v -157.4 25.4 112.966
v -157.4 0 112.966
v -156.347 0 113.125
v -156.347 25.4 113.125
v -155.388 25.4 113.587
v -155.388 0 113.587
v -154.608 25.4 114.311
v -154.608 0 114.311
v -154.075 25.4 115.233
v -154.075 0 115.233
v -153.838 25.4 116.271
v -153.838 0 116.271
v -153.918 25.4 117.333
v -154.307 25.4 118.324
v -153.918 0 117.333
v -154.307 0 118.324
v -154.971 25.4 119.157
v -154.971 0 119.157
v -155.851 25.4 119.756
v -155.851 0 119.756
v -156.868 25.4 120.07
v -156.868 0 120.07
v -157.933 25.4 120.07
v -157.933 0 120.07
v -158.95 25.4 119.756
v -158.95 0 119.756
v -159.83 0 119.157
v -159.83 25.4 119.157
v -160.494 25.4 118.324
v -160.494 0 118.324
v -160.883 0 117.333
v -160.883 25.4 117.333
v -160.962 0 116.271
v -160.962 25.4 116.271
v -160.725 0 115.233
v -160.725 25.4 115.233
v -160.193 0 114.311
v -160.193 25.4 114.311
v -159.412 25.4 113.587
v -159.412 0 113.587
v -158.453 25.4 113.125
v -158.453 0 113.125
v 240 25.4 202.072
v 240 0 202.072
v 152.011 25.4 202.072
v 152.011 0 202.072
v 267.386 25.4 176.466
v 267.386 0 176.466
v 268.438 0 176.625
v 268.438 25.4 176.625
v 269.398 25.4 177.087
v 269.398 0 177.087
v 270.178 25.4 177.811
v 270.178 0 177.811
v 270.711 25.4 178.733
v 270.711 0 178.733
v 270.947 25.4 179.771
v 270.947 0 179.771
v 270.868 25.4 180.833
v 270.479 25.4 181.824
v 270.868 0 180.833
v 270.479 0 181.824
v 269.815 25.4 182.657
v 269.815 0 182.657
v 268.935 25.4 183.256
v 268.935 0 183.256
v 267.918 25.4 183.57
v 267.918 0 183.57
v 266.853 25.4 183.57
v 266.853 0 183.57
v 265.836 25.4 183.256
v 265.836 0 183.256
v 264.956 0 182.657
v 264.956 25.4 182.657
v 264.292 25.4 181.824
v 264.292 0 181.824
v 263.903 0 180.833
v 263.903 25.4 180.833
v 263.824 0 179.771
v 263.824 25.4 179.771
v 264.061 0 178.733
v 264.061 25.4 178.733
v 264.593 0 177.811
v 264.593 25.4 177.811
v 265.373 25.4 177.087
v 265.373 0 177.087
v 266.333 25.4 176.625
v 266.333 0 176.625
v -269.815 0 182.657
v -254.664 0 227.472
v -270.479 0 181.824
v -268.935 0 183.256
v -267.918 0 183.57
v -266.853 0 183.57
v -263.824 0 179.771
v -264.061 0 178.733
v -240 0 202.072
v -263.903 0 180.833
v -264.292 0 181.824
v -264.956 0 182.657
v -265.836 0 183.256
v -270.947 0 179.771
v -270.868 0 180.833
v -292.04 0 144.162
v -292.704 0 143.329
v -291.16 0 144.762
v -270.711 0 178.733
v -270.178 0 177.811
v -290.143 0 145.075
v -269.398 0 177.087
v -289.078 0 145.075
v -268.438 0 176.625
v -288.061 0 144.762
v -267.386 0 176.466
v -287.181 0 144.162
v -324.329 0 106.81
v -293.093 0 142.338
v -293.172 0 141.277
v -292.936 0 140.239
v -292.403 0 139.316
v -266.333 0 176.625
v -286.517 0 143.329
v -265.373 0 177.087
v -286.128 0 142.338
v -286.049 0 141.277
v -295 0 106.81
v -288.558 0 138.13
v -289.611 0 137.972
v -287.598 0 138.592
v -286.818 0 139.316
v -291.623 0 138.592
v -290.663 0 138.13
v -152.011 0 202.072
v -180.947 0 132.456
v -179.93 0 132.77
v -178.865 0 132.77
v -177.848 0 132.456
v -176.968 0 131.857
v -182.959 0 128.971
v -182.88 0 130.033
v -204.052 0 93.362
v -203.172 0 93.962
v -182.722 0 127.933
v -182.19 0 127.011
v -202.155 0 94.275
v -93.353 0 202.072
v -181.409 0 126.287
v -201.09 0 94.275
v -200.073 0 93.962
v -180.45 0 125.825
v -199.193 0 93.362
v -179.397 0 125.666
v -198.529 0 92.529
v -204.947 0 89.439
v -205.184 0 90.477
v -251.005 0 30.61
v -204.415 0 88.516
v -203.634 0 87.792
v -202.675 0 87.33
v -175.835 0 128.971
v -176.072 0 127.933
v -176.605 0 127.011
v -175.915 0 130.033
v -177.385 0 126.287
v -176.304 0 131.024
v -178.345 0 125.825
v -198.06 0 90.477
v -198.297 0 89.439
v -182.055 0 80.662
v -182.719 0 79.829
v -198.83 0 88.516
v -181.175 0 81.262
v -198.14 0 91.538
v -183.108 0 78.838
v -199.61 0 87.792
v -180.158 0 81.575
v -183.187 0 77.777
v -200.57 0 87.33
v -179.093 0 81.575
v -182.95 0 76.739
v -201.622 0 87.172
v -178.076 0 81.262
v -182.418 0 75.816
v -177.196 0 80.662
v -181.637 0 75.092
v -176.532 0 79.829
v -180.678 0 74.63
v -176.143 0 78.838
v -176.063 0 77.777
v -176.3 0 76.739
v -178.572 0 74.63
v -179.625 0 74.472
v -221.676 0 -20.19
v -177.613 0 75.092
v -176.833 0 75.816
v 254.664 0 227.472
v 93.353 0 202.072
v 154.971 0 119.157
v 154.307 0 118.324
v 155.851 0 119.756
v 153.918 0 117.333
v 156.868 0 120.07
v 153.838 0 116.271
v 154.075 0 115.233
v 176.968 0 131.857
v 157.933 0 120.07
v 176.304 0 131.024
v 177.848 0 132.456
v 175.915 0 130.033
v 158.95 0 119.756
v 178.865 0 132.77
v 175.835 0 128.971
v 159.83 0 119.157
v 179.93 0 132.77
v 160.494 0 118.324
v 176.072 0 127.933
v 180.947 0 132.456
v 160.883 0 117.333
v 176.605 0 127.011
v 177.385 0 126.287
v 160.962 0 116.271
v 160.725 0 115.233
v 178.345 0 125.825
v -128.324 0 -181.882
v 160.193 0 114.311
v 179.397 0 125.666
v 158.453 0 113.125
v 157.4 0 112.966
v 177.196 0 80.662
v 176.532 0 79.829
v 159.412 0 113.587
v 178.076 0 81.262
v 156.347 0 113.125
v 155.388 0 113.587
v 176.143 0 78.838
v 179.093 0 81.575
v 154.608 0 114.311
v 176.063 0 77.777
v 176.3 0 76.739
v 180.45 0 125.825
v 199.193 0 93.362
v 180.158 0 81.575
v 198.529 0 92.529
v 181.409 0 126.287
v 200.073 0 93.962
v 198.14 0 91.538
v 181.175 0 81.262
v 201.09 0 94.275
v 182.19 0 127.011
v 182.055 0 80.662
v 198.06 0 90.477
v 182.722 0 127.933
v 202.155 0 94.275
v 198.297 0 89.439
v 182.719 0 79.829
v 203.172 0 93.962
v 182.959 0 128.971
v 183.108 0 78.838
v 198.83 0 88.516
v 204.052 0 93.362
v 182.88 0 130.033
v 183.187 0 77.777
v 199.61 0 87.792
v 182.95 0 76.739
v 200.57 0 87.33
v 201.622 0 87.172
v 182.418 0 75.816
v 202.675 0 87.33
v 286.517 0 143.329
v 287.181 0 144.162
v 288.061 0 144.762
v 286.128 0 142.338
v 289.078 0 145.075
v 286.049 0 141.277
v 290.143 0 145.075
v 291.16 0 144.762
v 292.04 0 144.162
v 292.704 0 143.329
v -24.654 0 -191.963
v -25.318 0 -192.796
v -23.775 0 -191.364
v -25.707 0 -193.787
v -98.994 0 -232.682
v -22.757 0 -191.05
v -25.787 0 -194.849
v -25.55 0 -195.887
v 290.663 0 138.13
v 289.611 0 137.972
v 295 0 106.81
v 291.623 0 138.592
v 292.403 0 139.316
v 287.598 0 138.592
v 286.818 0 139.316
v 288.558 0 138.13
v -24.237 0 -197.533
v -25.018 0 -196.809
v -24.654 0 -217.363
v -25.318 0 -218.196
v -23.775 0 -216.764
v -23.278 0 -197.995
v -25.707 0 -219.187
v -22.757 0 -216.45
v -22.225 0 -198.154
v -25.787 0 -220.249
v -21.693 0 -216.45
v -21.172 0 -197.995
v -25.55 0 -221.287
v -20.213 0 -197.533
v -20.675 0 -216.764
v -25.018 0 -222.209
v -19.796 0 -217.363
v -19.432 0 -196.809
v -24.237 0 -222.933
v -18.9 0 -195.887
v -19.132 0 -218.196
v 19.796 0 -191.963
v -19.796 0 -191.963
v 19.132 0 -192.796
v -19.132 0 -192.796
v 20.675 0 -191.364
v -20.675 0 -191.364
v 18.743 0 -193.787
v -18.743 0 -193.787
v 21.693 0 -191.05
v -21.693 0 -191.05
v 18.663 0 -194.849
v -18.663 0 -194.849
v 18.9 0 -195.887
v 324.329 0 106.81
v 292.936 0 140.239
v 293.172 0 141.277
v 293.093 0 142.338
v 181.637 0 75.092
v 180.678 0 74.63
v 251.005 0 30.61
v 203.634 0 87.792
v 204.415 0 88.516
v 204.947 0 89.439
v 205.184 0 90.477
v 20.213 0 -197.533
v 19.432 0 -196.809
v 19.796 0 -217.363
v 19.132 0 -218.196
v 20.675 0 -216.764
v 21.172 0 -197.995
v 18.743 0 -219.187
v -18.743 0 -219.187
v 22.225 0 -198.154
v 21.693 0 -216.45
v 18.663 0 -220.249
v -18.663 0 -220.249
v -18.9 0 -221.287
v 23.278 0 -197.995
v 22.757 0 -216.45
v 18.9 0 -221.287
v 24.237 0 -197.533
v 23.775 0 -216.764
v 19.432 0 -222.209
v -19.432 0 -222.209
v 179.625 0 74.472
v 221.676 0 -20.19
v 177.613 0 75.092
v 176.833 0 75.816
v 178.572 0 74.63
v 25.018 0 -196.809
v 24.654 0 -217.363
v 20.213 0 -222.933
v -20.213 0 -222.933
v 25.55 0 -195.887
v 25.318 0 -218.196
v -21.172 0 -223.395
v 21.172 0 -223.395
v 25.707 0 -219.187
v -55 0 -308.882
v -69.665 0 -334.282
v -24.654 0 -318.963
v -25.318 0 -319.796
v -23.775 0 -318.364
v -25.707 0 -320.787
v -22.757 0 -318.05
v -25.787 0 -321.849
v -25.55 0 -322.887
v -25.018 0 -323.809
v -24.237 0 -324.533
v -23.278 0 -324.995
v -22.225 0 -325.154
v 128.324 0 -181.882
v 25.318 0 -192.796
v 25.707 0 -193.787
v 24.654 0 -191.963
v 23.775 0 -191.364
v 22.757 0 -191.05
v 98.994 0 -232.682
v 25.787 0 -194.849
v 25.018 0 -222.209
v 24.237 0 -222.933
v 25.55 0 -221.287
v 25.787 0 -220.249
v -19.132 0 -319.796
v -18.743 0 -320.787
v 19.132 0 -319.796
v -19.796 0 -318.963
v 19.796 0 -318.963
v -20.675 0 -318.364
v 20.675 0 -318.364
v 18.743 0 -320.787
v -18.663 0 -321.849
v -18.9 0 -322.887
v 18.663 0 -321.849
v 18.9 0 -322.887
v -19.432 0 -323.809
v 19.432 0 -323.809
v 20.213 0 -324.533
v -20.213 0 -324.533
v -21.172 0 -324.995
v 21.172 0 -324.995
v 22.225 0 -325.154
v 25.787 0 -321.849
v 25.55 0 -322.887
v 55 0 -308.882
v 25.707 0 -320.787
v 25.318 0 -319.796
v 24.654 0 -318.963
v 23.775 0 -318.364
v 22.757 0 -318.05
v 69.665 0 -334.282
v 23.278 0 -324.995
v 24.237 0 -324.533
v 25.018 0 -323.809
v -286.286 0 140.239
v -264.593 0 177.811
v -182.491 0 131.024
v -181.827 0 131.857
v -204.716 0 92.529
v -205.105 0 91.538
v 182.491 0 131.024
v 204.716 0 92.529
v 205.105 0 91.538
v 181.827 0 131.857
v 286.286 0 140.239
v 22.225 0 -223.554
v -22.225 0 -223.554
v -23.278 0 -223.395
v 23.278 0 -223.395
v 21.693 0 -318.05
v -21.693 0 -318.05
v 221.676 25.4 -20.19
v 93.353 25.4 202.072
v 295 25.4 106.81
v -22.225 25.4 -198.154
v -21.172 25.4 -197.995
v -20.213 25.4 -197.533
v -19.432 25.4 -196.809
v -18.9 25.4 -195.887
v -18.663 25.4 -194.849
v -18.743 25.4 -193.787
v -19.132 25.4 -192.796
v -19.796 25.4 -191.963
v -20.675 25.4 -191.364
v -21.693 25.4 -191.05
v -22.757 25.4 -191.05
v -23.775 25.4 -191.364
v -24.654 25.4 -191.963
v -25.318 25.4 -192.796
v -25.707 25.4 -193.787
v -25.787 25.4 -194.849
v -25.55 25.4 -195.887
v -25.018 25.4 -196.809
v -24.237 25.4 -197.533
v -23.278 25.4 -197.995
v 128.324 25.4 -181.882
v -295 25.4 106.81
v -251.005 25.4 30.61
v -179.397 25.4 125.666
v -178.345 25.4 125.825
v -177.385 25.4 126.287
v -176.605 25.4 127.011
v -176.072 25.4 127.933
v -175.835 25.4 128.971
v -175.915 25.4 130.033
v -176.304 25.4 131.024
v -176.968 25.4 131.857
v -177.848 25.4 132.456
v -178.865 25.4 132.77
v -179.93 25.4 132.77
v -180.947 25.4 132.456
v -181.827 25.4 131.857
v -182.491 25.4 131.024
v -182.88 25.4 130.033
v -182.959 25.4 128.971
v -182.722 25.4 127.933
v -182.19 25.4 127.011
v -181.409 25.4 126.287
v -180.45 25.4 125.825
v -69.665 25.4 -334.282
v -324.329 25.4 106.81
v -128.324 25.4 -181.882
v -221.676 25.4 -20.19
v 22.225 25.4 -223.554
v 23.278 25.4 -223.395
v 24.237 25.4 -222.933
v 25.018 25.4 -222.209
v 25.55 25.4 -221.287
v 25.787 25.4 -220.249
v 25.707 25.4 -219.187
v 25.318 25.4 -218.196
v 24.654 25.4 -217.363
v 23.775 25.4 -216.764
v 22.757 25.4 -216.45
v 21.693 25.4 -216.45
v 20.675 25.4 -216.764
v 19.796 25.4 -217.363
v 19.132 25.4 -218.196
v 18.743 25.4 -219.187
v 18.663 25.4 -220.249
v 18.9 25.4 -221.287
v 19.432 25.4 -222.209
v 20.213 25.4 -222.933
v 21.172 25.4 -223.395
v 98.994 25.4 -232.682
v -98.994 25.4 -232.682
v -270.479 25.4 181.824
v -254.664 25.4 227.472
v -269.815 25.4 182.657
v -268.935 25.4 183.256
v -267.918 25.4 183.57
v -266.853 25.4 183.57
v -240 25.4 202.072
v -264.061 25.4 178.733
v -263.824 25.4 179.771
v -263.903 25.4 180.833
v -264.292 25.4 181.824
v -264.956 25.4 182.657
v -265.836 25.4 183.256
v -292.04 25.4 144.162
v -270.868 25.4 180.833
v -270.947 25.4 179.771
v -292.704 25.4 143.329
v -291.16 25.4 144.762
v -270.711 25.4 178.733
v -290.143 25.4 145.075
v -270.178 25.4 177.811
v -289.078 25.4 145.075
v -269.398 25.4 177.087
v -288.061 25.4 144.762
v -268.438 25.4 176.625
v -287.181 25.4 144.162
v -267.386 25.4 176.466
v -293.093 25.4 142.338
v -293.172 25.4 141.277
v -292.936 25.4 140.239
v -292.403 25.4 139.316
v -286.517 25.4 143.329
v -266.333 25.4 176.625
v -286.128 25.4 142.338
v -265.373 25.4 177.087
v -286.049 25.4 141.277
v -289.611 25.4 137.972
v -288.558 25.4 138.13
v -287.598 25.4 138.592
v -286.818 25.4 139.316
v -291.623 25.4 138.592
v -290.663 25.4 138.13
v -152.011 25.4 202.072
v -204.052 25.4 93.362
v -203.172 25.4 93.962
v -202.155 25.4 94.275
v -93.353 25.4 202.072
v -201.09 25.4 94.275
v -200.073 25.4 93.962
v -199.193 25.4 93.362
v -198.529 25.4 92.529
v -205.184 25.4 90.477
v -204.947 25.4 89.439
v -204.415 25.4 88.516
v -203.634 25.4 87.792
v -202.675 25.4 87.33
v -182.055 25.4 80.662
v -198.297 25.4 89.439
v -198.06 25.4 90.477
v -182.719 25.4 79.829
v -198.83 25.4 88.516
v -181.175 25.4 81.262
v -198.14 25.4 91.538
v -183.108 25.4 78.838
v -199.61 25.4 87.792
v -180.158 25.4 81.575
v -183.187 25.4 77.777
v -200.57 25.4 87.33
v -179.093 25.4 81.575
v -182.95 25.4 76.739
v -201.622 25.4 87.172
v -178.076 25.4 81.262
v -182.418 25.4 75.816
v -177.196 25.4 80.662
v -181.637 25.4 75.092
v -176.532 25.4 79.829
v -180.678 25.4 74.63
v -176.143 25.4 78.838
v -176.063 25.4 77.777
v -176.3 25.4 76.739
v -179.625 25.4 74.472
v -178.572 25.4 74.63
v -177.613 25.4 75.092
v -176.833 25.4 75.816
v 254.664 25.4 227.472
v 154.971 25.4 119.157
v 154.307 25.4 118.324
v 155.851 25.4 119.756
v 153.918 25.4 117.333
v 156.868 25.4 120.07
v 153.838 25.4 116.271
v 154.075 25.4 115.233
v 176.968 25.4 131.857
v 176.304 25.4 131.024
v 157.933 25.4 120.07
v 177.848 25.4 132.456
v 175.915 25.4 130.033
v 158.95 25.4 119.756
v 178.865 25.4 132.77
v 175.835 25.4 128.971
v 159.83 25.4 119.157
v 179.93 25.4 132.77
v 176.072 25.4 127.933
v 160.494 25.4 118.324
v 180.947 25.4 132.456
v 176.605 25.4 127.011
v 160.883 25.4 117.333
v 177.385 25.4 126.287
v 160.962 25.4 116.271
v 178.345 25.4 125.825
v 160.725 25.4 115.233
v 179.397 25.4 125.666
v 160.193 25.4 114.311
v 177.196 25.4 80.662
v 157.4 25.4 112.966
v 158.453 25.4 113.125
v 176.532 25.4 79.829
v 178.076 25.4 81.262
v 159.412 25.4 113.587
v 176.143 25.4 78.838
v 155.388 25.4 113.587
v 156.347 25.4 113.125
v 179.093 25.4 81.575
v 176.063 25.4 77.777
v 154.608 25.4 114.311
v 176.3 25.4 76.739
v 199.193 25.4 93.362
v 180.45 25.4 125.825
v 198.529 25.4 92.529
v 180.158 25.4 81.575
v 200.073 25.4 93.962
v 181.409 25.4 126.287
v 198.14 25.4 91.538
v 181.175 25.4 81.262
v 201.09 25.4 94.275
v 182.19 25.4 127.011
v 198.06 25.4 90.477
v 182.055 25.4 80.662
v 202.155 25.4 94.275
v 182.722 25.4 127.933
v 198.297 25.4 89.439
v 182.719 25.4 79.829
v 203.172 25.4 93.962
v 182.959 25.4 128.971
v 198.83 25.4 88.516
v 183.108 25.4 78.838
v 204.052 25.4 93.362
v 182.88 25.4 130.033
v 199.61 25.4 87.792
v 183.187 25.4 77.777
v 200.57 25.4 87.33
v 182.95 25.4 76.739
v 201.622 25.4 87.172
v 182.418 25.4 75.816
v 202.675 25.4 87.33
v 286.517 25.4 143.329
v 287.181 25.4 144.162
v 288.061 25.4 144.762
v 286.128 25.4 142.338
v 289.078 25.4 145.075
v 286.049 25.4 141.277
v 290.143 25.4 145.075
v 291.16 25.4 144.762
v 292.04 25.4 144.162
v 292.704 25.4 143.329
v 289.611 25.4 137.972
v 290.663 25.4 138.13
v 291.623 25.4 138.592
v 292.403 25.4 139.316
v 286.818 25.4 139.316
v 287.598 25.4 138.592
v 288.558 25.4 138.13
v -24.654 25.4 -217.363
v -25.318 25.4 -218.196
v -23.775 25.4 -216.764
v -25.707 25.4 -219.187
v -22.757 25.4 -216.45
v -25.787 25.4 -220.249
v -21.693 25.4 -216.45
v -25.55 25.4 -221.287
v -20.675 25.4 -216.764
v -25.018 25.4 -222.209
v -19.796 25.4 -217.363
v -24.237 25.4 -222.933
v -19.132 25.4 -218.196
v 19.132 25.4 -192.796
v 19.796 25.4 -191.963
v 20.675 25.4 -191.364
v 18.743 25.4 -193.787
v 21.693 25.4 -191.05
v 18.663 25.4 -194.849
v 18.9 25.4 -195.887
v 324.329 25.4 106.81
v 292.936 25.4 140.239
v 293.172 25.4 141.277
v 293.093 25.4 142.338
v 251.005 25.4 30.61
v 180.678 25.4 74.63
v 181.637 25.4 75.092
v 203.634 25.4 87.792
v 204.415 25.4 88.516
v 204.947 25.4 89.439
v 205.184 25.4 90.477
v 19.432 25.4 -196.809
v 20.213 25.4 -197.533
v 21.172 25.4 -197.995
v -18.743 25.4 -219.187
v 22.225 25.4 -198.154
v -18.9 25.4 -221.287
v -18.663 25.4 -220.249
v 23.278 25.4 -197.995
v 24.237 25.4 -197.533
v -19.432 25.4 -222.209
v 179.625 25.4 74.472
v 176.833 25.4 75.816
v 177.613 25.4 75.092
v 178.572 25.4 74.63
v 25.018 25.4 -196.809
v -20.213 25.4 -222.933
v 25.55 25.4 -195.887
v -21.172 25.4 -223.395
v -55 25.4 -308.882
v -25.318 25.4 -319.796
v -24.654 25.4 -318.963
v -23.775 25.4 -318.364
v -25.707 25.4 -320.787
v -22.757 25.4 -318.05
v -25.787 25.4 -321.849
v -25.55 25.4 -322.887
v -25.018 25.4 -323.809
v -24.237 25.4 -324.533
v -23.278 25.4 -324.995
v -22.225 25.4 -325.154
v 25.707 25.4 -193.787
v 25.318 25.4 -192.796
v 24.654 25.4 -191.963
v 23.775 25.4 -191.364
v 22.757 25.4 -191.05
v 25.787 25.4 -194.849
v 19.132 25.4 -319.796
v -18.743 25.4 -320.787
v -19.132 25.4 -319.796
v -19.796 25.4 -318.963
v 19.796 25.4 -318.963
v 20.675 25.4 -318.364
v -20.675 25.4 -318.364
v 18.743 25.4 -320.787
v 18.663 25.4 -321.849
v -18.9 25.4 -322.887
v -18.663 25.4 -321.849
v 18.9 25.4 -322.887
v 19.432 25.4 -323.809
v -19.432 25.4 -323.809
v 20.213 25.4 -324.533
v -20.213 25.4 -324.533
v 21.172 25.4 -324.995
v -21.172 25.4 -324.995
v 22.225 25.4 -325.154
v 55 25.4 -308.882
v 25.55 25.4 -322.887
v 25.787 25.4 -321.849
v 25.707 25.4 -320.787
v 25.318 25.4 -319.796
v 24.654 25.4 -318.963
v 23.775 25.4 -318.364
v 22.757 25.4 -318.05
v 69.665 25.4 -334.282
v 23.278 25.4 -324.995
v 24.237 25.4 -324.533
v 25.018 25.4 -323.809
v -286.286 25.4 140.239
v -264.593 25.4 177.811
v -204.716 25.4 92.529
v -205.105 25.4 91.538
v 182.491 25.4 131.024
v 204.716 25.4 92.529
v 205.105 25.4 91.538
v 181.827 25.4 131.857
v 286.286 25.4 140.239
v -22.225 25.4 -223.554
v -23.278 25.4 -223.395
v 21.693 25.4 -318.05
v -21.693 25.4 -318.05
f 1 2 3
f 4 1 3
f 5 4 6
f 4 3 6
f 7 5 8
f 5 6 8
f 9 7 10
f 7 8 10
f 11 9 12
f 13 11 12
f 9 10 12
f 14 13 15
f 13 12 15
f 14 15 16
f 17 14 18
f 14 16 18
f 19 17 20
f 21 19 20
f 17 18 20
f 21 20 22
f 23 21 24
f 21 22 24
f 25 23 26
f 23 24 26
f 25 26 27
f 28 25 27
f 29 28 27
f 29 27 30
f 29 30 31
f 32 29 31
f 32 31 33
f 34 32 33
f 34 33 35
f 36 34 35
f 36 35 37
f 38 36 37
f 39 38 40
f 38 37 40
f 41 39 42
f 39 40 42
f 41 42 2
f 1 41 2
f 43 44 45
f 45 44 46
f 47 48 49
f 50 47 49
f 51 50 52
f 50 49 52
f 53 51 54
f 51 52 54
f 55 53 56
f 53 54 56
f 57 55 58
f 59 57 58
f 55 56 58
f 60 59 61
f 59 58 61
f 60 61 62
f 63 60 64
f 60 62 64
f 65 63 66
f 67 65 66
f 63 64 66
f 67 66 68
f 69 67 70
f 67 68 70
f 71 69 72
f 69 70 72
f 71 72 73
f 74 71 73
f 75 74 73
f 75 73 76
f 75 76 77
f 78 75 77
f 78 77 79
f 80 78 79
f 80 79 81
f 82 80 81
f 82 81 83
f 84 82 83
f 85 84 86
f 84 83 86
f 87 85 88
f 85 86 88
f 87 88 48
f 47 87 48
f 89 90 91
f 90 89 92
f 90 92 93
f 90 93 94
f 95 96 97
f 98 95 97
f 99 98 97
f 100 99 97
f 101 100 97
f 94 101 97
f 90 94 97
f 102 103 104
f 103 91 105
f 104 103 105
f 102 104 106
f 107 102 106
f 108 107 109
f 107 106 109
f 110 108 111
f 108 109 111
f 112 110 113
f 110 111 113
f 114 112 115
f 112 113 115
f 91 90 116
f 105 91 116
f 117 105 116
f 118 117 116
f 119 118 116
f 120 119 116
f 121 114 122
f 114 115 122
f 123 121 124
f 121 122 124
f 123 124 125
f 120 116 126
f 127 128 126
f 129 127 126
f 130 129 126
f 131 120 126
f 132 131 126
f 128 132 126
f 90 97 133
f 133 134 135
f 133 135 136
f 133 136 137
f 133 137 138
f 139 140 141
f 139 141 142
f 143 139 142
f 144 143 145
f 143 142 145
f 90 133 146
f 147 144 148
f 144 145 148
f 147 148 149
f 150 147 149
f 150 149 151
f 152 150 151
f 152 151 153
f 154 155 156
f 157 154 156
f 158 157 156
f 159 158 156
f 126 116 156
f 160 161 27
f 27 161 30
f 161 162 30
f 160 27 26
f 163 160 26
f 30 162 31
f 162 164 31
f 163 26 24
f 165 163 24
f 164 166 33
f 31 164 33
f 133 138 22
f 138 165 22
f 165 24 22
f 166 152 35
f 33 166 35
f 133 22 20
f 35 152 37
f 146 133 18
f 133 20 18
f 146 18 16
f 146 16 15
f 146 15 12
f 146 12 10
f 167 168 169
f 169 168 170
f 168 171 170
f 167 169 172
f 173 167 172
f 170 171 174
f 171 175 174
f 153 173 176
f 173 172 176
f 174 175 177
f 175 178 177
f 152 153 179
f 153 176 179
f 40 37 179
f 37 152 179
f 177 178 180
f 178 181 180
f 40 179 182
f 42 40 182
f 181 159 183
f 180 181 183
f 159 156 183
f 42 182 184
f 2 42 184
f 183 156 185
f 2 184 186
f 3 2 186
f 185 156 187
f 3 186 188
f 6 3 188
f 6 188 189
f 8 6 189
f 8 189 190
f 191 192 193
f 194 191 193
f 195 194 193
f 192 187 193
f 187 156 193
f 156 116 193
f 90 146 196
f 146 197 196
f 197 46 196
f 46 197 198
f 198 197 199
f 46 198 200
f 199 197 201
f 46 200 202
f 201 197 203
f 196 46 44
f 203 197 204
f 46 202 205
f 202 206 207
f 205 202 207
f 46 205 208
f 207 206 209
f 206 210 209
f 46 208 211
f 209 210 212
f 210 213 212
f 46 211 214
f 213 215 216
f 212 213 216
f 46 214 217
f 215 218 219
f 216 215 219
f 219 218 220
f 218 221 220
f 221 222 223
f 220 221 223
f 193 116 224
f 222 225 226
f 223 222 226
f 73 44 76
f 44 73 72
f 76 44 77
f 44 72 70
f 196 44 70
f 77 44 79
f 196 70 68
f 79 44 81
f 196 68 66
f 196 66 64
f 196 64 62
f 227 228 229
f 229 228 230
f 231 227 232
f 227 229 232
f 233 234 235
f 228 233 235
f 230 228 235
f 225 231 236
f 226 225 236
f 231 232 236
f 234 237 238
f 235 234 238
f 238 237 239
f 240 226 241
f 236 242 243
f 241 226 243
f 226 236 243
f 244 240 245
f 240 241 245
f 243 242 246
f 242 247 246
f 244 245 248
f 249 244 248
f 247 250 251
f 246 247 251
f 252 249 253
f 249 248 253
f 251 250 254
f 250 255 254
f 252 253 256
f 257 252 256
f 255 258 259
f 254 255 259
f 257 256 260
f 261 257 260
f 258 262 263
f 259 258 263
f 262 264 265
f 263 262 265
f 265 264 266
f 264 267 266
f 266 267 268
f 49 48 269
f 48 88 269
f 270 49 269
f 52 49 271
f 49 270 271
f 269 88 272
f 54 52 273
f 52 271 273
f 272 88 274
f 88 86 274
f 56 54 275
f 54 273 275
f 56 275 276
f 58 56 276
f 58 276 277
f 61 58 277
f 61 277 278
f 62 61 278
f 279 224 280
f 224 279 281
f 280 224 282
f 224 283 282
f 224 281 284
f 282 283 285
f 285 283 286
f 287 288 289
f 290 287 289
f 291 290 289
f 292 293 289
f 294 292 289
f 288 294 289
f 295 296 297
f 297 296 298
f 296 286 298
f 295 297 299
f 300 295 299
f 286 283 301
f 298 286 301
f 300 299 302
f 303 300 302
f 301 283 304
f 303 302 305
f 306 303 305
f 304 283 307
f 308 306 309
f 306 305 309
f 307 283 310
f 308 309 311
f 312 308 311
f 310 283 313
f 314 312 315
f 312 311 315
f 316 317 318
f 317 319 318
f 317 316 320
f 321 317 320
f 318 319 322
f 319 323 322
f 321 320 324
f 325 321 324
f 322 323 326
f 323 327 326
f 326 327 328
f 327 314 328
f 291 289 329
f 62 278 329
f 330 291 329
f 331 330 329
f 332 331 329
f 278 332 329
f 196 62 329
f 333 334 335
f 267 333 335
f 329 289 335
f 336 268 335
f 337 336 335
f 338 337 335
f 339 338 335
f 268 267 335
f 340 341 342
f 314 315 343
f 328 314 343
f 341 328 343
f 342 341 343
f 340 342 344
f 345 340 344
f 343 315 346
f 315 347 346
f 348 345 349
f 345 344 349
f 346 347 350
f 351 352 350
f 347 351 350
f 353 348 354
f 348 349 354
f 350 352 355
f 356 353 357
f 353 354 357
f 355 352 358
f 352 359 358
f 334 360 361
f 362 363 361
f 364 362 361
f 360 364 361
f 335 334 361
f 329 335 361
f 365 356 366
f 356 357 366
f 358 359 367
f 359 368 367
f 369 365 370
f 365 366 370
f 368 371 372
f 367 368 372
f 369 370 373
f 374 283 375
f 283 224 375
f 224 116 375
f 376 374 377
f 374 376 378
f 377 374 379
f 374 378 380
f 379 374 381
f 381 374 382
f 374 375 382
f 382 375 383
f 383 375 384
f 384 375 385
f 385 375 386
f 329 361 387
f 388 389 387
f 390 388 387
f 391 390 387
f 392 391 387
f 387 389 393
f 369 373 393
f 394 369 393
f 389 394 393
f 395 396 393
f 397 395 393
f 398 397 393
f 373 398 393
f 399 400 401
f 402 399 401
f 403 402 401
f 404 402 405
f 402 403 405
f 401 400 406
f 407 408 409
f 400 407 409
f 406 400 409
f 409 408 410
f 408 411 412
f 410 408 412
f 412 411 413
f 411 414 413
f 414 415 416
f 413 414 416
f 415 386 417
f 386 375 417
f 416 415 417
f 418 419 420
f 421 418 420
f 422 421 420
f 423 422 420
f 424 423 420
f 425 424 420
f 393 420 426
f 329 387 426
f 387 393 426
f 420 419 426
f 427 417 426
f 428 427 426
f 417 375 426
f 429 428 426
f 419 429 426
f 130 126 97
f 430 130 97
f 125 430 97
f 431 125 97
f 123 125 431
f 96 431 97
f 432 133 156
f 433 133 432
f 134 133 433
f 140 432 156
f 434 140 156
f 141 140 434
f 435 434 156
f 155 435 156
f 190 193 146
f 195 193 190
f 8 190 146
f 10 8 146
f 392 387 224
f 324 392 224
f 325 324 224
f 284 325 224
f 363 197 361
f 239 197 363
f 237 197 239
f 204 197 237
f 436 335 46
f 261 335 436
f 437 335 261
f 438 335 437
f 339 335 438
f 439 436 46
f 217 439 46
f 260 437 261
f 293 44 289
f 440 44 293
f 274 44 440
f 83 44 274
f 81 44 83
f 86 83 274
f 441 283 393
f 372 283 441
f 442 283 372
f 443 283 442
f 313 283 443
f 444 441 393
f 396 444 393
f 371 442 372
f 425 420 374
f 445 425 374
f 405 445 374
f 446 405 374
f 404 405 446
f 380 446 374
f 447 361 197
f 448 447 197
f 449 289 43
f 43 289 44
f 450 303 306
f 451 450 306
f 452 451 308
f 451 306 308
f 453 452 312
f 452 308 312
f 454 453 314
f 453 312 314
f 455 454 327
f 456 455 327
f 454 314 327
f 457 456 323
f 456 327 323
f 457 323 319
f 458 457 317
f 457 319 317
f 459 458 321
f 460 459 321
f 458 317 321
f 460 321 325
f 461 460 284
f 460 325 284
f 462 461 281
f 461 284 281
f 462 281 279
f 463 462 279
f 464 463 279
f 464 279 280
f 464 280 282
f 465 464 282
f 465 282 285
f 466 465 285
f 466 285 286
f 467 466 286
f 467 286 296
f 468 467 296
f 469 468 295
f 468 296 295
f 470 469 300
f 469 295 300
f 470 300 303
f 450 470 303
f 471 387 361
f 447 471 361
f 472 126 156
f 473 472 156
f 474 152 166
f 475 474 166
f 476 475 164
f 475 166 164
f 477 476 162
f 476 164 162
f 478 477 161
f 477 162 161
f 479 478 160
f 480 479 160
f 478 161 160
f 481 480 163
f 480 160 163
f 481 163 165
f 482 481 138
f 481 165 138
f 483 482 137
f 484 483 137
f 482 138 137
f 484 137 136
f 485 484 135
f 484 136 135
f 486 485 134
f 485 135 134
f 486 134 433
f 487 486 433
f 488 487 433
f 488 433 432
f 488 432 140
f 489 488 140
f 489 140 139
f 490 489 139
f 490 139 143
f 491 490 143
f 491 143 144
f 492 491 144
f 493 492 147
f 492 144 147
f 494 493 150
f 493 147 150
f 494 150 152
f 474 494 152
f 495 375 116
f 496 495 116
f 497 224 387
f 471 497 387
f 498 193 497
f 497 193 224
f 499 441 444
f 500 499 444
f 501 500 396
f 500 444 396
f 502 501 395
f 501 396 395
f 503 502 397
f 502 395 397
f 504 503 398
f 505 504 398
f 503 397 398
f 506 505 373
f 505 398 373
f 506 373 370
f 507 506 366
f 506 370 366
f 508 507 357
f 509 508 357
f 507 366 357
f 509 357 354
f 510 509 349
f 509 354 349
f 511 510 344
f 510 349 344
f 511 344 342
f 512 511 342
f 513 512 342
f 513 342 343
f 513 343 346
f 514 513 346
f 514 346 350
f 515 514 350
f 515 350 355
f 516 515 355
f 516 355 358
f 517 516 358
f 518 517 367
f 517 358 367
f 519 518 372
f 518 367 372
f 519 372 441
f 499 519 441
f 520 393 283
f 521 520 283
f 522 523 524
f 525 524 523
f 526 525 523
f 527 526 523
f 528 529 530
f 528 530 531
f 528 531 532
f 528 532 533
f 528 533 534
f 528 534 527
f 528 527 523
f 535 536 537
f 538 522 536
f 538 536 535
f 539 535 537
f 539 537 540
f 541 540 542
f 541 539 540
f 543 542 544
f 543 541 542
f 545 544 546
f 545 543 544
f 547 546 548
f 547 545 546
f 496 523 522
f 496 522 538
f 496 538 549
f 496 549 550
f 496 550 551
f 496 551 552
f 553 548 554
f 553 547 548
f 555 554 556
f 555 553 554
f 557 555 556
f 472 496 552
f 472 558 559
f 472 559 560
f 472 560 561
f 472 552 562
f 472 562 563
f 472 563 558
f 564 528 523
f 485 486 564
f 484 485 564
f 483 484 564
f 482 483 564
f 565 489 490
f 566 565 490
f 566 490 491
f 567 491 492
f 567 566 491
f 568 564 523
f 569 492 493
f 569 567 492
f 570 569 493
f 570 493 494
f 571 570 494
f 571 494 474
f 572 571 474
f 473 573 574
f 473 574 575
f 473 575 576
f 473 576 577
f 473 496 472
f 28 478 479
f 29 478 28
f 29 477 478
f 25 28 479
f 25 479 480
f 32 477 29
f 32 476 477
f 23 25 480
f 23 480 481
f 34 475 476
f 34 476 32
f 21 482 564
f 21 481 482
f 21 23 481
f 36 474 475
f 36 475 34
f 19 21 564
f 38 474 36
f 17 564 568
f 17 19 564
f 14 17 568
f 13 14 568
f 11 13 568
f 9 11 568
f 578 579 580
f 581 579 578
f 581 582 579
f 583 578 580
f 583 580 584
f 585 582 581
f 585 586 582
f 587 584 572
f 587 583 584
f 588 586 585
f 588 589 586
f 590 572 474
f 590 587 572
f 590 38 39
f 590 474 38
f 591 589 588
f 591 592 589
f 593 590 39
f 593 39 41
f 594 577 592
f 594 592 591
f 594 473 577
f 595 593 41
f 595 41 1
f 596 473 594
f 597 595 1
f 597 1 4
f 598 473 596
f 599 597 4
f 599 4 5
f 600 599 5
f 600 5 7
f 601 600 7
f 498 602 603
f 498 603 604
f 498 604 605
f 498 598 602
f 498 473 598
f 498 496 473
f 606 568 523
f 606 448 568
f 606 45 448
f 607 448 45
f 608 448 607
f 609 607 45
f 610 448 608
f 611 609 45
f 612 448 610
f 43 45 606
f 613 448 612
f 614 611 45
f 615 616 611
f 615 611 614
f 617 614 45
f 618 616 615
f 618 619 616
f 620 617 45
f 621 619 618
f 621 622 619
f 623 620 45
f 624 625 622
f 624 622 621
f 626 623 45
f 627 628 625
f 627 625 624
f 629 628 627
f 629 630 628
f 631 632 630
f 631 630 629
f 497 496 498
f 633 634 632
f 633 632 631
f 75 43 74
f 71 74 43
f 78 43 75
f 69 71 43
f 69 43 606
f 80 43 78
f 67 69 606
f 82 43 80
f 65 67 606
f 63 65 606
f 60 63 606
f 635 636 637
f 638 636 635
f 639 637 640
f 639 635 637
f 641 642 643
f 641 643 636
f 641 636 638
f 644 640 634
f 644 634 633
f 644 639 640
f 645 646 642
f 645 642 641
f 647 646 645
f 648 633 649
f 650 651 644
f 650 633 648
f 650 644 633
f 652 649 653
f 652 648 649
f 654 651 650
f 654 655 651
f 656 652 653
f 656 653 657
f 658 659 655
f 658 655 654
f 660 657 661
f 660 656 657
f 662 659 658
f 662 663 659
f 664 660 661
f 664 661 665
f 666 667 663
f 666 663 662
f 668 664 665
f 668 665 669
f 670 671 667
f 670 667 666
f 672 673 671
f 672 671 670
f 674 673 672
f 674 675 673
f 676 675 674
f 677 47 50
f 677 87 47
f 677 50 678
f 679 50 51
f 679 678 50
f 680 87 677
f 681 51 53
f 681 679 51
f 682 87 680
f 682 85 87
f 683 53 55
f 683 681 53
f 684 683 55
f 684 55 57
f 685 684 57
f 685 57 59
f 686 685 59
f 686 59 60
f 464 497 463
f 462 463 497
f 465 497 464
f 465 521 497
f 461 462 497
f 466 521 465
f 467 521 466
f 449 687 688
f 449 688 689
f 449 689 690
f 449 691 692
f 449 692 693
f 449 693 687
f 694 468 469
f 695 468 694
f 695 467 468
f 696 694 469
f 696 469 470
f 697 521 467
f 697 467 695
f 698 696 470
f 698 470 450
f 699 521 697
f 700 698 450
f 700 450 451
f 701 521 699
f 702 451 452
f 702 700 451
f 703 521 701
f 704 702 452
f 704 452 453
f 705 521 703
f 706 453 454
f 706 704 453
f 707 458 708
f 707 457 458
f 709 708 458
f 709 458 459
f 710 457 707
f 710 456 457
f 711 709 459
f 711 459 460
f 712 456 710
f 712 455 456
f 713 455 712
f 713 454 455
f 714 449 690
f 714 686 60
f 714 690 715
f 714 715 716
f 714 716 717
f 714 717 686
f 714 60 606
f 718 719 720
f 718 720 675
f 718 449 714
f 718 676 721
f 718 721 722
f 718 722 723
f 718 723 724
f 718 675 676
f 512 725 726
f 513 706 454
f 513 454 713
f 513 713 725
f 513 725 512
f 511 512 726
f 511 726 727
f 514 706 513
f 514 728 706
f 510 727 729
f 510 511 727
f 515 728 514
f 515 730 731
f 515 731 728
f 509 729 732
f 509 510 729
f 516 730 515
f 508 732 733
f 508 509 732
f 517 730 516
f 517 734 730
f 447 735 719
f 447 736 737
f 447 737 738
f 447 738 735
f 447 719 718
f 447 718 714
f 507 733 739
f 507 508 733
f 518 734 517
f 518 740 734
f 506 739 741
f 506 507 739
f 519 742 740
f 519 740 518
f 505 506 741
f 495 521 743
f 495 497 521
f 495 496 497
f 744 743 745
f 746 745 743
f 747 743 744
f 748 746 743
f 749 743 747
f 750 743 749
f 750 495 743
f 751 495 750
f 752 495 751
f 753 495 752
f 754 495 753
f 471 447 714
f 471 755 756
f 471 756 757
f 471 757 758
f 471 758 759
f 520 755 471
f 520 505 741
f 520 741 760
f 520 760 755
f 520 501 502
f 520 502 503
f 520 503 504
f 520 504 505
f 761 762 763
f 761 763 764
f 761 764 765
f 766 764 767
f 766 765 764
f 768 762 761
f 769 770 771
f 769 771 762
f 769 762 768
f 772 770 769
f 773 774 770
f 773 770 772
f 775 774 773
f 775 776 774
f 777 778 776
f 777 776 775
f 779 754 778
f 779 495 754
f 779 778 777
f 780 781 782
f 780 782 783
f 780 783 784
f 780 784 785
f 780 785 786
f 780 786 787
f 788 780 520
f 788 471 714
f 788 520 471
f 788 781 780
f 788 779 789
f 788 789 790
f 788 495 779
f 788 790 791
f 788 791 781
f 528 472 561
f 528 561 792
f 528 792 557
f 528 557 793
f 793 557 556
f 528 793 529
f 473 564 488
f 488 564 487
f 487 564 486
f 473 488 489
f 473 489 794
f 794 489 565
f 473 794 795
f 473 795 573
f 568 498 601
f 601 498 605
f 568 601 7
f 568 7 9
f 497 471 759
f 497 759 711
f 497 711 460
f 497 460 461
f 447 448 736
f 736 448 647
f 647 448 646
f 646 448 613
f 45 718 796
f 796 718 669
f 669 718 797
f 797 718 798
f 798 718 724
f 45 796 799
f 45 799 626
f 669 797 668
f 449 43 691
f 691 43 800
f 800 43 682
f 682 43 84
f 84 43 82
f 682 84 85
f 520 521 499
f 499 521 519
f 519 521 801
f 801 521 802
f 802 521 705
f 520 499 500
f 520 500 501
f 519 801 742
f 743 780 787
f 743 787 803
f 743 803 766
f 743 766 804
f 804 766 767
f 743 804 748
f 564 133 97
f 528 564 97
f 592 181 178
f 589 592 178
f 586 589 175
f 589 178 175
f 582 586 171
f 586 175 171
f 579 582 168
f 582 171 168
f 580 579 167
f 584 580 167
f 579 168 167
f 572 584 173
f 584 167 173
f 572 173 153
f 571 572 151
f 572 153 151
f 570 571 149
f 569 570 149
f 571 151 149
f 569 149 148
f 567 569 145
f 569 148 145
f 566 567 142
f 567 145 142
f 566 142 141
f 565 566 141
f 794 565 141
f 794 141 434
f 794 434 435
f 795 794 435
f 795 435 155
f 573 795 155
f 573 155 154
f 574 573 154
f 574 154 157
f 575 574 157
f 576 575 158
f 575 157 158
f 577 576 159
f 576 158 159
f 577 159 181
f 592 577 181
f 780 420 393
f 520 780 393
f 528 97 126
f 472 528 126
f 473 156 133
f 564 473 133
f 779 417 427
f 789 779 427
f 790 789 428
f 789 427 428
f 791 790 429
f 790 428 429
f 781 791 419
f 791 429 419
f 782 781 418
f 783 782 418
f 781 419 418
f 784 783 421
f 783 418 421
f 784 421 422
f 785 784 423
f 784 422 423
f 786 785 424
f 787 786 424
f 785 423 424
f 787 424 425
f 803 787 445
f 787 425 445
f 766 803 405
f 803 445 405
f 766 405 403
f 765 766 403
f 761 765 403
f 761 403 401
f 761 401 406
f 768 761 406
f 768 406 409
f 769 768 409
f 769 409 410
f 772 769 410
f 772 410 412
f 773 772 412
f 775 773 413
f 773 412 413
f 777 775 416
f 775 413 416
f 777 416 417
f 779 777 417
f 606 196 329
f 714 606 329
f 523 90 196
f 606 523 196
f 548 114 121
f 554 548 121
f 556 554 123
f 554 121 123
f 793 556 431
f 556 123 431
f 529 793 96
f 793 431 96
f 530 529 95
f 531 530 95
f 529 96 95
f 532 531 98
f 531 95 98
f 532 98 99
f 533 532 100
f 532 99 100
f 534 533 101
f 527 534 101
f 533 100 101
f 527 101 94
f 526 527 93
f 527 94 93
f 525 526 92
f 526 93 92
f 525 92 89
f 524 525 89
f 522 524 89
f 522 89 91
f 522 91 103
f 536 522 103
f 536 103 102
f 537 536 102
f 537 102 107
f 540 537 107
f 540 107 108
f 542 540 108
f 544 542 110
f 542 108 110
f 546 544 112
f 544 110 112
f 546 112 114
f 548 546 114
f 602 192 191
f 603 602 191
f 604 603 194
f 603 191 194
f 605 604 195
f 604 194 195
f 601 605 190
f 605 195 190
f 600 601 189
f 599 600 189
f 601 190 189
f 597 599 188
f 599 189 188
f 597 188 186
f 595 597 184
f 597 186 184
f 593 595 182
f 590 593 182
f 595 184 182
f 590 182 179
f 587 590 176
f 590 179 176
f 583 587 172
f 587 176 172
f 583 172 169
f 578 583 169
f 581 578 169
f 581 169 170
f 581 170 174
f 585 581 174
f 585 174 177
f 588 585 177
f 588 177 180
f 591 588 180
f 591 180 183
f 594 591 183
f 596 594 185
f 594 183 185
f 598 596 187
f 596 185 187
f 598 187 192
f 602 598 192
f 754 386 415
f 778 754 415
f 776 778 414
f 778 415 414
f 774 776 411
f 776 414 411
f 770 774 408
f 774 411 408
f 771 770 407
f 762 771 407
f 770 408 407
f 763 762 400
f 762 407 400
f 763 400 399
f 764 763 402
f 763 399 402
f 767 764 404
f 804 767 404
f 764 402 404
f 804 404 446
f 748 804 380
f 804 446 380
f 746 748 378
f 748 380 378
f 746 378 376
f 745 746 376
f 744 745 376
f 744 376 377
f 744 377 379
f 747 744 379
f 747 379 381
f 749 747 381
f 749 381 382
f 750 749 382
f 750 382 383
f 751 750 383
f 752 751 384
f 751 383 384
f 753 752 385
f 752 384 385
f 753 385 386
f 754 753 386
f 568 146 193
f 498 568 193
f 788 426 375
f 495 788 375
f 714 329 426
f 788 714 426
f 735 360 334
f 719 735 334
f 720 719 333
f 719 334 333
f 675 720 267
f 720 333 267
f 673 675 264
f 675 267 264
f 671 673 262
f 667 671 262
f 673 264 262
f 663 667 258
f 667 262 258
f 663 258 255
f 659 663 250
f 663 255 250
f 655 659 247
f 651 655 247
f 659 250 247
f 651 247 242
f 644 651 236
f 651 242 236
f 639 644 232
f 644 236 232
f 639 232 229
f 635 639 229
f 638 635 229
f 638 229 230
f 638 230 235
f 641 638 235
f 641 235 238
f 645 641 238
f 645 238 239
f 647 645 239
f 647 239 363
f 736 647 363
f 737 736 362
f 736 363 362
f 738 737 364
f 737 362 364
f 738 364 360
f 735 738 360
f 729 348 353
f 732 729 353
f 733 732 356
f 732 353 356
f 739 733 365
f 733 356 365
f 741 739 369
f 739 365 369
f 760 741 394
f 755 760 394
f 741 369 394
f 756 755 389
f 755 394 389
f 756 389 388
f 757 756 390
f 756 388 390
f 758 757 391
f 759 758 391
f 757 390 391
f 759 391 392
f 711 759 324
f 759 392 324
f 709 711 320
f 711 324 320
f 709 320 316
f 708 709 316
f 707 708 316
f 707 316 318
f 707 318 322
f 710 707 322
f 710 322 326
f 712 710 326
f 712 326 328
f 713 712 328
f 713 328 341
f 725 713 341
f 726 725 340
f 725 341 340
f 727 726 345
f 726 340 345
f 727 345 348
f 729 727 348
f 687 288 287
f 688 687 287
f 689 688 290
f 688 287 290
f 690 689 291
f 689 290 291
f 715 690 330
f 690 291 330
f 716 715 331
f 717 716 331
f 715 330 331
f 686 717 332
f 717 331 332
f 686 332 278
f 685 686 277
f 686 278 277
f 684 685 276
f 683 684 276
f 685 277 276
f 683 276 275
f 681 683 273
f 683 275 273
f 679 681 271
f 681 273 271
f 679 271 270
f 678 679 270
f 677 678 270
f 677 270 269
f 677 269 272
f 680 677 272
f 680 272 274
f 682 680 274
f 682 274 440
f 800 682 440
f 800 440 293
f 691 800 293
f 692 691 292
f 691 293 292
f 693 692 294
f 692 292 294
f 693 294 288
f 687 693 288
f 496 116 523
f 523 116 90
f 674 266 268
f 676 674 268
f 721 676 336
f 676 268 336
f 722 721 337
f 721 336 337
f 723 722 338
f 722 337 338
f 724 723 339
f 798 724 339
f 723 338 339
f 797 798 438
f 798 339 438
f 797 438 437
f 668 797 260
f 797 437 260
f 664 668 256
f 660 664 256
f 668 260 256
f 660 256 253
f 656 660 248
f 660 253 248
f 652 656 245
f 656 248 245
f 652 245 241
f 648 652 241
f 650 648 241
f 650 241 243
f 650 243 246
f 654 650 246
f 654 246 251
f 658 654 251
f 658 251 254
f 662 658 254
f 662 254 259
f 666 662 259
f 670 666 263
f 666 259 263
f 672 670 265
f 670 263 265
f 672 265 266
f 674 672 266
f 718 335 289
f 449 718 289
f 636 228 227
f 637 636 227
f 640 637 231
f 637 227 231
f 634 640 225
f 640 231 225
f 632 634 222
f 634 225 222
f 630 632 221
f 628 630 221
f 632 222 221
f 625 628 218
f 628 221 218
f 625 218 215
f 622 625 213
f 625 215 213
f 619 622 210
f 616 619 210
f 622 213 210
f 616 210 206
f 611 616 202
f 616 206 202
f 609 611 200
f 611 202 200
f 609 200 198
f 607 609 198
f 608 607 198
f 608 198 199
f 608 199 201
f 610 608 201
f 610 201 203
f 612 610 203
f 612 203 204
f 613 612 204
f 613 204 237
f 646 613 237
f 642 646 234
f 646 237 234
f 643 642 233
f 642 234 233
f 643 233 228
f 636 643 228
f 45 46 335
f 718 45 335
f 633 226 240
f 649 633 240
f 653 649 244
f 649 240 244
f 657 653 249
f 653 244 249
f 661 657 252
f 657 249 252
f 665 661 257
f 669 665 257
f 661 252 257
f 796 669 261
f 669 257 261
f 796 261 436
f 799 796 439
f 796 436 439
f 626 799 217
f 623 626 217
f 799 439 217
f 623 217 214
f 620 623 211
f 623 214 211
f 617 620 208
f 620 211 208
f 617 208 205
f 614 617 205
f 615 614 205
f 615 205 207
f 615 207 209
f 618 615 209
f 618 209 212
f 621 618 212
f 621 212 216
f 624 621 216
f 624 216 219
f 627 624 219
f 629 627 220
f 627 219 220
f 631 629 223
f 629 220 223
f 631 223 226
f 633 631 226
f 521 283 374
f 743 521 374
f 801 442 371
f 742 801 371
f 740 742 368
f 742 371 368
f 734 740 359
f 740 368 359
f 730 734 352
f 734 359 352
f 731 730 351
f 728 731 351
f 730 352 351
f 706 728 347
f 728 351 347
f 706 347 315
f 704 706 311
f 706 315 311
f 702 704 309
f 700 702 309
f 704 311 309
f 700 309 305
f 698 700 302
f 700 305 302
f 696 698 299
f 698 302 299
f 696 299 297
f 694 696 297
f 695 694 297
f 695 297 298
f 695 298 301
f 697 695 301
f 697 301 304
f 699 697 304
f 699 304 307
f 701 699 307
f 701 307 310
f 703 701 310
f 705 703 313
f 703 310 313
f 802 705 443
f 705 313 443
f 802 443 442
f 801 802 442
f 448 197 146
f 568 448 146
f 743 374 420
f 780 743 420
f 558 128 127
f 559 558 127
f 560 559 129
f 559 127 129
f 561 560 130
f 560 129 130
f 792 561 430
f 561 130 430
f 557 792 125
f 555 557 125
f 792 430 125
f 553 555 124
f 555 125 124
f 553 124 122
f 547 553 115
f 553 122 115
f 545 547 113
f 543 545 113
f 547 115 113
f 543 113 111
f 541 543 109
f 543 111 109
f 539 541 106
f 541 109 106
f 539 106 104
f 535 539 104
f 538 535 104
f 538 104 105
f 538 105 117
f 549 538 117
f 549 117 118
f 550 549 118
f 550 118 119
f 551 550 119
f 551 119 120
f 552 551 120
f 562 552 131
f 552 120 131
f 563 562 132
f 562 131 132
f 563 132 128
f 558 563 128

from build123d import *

# Parameters (mm, degrees)
BOSS_EXTRUDE2_DEPTH = 25.4
SKETCH2_R           = 3.571875
CUT_EXTRUDE1_DEPTH  = 25.4


with BuildPart() as part:
    # Sketch1 → Boss-Extrude2 (new body)
    # profile 1 of 4: a face of its own
    with BuildSketch(Plane(origin=(0, 0, 0), x_dir=(1, 0, 0), z_dir=(0, 1, 0))):
        Polygon((-69.664713837, 334.281849575), (-324.328930675, -106.809512857), (-254.664216837, -227.472336718), (254.664216837, -227.472336718), (324.328930675, -106.809512857), (69.664713837, 334.281849575), align=None)
        Polygon((-239.99952, -202.072336718), (-294.999537, -106.809512857), (-55.000017, 308.881849575), (55.000017, 308.881849575), (294.999537, -106.809512857), (239.99952, -202.072336718), align=None, mode=Mode.SUBTRACT)
    # profile 2 of 4: a face of its own
    with BuildSketch(Plane(origin=(0, 0, 0), x_dir=(1, 0, 0), z_dir=(0, 1, 0))):
        Polygon((-93.352551626, -202.072336718), (-221.676052813, 20.190487143), (-251.005446488, -30.609512857), (-152.011338976, -202.072336718), align=None)
    # profile 3 of 4: a face of its own
    with BuildSketch(Plane(origin=(0, 0, 0), x_dir=(1, 0, 0), z_dir=(0, 1, 0))):
        Polygon((251.005446488, -30.609512857), (221.676052813, 20.190487143), (93.352551626, -202.072336718), (152.011338976, -202.072336718), align=None)
    # profile 4 of 4: a face of its own
    with BuildSketch(Plane(origin=(0, 0, 0), x_dir=(1, 0, 0), z_dir=(0, 1, 0))):
        Polygon((98.994107512, 232.681849575), (-98.994107512, 232.681849575), (-128.323501187, 181.881849575), (128.323501187, 181.881849575), align=None)
    extrude(amount=BOSS_EXTRUDE2_DEPTH)

    # Sketch2 → Cut-Extrude1 (cut)
    with BuildSketch(Plane.XZ):
        with Locations(Location((-289.610551128, 141.543510188, 0), (0, 0, 270))):
            Circle(SKETCH2_R)
        with Locations(Location((-267.385551128, 180.038339387, 0), (0, 0, 270))):
            Circle(SKETCH2_R)
        with Locations(Location((267.385551128, 180.038339387, 0), (0, 0, 270))):
            Circle(SKETCH2_R)
        with Locations(Location((289.610551128, 141.543510188, 0), (0, 0, 270))):
            Circle(SKETCH2_R)
        with Locations(Location((22.225, -321.581849575, 0), (0, 0, 270))):
            Circle(SKETCH2_R)
        with Locations(Location((-22.225, -321.581849575, 0), (0, 0, 270))):
            Circle(SKETCH2_R)
        with Locations(Location((-201.622370104, 90.743510188, 0), (0, 0, 270))):
            Circle(SKETCH2_R)
        with Locations(Location((-179.397370104, 129.238339387, 0), (0, 0, 270))):
            Circle(SKETCH2_R)
        with Locations(Location((-157.400324847, 116.538339387, 0), (0, 0, 270))):
            Circle(SKETCH2_R)
        with Locations(Location((-179.625324847, 78.043510188, 0), (0, 0, 270))):
            Circle(SKETCH2_R)
        with Locations(Location((201.622370104, 90.743510188, 0), (0, 0, 270))):
            Circle(SKETCH2_R)
        with Locations(Location((179.397370104, 129.238339387, 0), (0, 0, 270))):
            Circle(SKETCH2_R)
        with Locations(Location((-22.225, -219.981849575, 0), (0, 0, 270))):
            Circle(SKETCH2_R)
        with Locations(Location((22.225, -219.981849575, 0), (0, 0, 270))):
            Circle(SKETCH2_R)
        with Locations(Location((179.625324847, 78.043510188, 0), (0, 0, 270))):
            Circle(SKETCH2_R)
        with Locations(Location((157.400324847, 116.538339387, 0), (0, 0, 270))):
            Circle(SKETCH2_R)
        with Locations(Location((-22.225, -194.581849575, 0), (0, 0, 270))):
            Circle(SKETCH2_R)
        with Locations(Location((22.225, -194.581849575, 0), (0, 0, 270))):
            Circle(SKETCH2_R)
    extrude(amount=-CUT_EXTRUDE1_DEPTH, mode=Mode.SUBTRACT)


solid = part.part
